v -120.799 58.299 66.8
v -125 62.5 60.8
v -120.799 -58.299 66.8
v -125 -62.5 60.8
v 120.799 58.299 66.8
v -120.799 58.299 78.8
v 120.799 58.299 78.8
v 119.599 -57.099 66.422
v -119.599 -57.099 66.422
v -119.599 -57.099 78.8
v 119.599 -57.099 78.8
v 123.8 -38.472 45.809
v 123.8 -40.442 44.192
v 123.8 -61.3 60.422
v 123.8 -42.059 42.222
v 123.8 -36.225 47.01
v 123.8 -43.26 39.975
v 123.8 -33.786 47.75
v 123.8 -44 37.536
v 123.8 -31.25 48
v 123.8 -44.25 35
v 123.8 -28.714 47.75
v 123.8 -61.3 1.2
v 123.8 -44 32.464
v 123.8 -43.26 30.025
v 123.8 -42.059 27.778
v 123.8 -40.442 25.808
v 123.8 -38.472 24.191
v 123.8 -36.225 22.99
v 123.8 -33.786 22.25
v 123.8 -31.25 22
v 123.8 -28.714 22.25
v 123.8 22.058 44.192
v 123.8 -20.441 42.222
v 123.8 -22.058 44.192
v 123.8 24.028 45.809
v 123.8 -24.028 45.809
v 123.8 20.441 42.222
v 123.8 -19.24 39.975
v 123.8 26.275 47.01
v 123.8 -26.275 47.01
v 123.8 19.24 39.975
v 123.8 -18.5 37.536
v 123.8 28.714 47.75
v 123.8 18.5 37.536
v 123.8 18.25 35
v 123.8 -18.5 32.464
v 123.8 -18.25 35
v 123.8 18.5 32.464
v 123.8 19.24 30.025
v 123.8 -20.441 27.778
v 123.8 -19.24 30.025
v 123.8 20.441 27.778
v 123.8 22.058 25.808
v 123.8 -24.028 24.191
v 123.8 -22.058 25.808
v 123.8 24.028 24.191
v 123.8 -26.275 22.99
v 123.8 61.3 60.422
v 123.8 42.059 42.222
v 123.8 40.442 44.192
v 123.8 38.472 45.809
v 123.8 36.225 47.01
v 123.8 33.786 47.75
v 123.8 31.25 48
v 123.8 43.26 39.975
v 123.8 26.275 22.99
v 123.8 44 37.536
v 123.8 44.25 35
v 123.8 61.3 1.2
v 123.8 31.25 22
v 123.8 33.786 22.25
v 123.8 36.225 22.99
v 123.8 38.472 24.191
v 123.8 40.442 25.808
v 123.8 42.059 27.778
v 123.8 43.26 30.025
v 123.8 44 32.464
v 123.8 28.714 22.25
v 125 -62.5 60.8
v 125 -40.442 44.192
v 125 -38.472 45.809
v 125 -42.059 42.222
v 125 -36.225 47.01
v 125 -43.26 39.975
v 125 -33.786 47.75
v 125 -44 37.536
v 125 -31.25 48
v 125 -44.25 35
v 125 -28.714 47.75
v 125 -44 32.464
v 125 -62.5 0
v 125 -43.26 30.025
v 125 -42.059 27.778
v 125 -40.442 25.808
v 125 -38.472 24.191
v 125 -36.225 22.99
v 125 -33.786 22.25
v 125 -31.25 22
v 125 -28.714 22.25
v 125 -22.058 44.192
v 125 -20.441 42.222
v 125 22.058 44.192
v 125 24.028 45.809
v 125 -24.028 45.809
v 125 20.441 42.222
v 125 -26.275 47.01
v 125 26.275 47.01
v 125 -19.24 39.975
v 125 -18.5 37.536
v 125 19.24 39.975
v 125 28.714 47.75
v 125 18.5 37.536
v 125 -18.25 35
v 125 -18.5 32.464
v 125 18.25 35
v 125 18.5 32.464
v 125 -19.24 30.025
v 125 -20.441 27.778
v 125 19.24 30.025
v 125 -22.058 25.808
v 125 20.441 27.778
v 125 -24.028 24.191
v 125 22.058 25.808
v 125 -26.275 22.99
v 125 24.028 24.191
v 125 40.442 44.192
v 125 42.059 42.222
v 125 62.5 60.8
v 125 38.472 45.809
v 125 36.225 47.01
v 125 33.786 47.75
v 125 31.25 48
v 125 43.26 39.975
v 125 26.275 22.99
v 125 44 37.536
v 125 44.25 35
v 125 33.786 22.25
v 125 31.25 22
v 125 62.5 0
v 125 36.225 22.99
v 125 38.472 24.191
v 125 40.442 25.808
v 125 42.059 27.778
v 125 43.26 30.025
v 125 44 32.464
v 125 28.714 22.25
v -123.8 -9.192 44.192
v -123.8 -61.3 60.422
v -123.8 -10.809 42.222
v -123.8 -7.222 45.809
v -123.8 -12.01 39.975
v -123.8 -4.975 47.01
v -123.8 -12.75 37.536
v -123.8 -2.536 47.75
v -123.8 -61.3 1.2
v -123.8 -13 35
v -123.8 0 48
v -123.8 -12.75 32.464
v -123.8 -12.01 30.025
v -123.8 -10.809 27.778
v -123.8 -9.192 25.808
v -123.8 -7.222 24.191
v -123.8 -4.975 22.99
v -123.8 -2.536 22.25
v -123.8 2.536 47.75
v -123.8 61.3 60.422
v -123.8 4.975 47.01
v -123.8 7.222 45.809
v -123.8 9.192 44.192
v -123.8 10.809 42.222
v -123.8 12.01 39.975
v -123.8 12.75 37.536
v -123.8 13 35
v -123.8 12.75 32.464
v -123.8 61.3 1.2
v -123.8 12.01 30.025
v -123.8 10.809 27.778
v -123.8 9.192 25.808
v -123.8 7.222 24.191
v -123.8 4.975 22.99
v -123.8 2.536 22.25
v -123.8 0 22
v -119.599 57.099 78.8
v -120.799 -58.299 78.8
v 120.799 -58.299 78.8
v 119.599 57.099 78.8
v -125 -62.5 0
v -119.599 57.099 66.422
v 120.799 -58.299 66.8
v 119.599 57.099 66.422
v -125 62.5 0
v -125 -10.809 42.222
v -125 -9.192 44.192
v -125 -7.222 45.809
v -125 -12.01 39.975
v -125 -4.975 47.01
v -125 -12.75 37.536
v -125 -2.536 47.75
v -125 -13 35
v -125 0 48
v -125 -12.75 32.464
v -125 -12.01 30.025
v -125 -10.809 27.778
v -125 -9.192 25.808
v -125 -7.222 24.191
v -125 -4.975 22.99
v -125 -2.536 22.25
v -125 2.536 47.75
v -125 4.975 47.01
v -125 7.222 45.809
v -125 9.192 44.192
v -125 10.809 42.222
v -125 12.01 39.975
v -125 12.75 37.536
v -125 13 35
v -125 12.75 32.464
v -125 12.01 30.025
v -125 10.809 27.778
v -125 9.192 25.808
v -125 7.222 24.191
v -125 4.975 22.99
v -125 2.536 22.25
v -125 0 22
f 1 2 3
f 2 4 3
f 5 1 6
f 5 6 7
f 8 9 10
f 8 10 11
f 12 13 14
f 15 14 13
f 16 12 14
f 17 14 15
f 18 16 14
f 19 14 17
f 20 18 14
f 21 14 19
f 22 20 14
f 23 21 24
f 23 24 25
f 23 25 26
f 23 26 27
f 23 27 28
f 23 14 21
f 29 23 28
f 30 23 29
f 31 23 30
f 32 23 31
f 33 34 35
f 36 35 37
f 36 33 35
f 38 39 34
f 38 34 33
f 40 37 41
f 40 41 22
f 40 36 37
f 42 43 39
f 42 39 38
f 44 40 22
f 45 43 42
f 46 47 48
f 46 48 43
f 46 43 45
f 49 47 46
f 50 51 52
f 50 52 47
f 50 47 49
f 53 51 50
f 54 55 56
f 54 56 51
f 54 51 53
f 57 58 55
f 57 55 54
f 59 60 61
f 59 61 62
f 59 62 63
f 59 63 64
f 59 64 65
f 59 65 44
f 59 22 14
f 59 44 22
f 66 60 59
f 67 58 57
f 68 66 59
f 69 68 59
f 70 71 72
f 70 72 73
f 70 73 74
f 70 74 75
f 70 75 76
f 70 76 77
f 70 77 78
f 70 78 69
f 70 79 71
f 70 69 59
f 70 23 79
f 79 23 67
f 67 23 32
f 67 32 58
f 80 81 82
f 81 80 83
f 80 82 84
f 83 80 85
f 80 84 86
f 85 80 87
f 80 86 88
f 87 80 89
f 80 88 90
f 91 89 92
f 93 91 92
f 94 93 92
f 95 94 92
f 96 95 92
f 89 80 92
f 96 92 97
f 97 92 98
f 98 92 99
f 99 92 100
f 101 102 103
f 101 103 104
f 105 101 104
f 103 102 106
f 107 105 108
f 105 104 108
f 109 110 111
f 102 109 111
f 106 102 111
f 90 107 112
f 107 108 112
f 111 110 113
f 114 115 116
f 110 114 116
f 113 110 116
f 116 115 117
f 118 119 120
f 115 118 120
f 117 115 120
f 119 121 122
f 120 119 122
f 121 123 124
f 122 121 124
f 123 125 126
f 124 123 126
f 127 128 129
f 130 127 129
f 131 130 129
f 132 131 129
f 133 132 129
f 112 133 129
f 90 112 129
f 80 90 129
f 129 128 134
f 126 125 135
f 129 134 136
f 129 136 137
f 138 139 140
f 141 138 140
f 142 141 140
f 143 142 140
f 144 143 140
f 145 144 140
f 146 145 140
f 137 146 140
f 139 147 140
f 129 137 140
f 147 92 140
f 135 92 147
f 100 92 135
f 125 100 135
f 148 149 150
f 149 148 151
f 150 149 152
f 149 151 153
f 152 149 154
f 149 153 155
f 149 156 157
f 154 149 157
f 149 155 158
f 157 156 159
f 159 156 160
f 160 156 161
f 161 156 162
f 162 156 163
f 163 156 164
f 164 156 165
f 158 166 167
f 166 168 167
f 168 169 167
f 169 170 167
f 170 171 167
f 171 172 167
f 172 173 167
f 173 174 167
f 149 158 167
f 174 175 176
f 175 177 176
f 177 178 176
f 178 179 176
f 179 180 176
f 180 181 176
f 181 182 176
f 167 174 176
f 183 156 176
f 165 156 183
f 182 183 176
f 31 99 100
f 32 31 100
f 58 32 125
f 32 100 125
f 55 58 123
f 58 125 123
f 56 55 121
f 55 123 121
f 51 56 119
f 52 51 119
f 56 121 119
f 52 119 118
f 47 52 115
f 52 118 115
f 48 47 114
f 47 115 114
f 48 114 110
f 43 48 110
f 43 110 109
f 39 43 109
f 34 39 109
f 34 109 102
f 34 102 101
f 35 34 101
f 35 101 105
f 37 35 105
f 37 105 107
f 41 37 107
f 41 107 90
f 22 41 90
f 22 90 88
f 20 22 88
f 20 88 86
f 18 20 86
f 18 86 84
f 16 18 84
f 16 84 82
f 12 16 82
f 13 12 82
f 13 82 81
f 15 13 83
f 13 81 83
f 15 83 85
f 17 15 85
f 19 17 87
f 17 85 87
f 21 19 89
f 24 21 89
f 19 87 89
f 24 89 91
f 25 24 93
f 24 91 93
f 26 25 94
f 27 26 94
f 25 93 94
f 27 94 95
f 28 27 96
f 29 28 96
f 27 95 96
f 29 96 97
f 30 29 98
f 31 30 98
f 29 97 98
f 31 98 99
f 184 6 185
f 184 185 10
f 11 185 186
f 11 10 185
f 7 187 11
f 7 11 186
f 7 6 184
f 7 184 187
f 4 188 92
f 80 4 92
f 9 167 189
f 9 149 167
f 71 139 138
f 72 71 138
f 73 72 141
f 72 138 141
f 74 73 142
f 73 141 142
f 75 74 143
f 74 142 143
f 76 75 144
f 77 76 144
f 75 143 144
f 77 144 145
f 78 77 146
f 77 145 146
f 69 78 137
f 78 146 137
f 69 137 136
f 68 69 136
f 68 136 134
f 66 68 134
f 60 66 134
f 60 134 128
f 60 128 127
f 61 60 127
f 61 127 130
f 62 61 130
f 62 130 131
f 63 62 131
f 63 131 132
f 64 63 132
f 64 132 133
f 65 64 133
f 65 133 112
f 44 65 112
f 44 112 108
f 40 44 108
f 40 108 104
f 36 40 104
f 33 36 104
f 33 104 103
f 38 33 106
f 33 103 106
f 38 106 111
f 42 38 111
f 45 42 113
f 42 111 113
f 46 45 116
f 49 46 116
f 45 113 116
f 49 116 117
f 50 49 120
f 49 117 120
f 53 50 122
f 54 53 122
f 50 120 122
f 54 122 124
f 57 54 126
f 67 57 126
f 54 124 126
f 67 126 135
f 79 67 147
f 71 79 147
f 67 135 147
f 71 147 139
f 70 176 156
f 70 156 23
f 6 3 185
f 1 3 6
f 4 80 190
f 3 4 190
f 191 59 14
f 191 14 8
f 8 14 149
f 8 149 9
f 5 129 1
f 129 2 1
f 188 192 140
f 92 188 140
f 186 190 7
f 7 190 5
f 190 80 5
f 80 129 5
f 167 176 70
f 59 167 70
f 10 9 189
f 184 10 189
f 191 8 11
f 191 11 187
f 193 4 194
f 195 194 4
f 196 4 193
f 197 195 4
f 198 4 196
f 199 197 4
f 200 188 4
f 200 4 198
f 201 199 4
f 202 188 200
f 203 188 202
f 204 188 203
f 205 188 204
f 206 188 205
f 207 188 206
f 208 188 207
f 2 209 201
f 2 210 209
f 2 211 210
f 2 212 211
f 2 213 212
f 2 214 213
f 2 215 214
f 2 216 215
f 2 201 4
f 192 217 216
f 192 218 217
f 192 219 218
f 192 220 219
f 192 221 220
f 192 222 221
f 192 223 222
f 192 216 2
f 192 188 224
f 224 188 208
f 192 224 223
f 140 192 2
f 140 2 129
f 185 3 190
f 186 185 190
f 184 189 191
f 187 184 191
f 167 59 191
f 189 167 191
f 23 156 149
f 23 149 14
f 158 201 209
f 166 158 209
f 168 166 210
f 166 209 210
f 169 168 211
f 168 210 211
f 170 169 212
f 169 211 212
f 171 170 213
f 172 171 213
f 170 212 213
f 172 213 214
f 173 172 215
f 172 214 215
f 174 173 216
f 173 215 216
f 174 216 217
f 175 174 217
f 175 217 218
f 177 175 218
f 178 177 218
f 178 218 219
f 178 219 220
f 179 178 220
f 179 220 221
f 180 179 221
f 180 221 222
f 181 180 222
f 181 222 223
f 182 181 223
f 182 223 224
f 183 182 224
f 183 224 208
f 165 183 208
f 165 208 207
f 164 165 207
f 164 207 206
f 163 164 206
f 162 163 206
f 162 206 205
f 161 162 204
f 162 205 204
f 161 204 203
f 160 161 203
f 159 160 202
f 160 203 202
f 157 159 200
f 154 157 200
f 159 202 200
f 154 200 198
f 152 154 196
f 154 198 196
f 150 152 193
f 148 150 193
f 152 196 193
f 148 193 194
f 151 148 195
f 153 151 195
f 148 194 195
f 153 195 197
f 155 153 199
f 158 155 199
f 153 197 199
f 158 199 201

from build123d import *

# Parameters (mm, degrees)
SKETCH_1_W          = 250
SKETCH_1_H          = 125
EXTRUDE_1_DEPTH     = 60.8
SKETCH_4_W          = 250
SKETCH_4_H          = 125
EXTRUDE_2_DEPTH     = 6
EXTRUDE_2_TAPER     = 35
SKETCH_5_W          = 241.597509542
SKETCH_5_H          = 116.597509542
EXTRUDE_3_DEPTH     = 12
SHELL_1_T           = -1.2
SKETCH_9_R          = 13
CUT_EXTRUDE_2_DEPTH = 12
SKETCH_10_R         = 13
CUT_EXTRUDE_3_DEPTH = 12


with BuildPart() as part:
    # 草图1 → 凸台-拉伸1 (new body)
    with BuildSketch(Plane.XY):
        Rectangle(SKETCH_1_W, SKETCH_1_H)
    extrude(amount=EXTRUDE_1_DEPTH)

    # 草图4 → 凸台-拉伸2 (add)
    with BuildSketch(Plane.XY.offset(60.8)):
        Rectangle(SKETCH_4_W, SKETCH_4_H)
    extrude(amount=EXTRUDE_2_DEPTH, taper=EXTRUDE_2_TAPER)

    # 草图5 → 凸台-拉伸3 (add)
    with BuildSketch(Plane.XY.offset(66.8)):
        Rectangle(SKETCH_5_W, SKETCH_5_H)
    extrude(amount=EXTRUDE_3_DEPTH)

    # 抽壳1
    shell_1_openings = [part.faces().sort_by_distance(p)[0] for p in [
        (0, 0, 78.8),
    ]]
    offset(amount=SHELL_1_T, openings=shell_1_openings, kind=Kind.INTERSECTION)

    # 草图9 → 切除-拉伸2 (cut)
    with BuildSketch(Plane.ZY.offset(125)):
        with Locations((35, 0)):
            Circle(SKETCH_9_R)
    extrude(amount=-CUT_EXTRUDE_2_DEPTH, mode=Mode.SUBTRACT)

    # 草图10 → 切除-拉伸3 (cut)
    with BuildSketch(Plane(origin=(125, 0, 0), x_dir=(0, 0, -1), z_dir=(1, 0, 0))):
        with Locations((-35, 31.25)):
            Circle(SKETCH_10_R)
        with Locations((-35, -31.25)):
            Circle(SKETCH_10_R)
    extrude(amount=-CUT_EXTRUDE_3_DEPTH, mode=Mode.SUBTRACT)


solid = part.part
